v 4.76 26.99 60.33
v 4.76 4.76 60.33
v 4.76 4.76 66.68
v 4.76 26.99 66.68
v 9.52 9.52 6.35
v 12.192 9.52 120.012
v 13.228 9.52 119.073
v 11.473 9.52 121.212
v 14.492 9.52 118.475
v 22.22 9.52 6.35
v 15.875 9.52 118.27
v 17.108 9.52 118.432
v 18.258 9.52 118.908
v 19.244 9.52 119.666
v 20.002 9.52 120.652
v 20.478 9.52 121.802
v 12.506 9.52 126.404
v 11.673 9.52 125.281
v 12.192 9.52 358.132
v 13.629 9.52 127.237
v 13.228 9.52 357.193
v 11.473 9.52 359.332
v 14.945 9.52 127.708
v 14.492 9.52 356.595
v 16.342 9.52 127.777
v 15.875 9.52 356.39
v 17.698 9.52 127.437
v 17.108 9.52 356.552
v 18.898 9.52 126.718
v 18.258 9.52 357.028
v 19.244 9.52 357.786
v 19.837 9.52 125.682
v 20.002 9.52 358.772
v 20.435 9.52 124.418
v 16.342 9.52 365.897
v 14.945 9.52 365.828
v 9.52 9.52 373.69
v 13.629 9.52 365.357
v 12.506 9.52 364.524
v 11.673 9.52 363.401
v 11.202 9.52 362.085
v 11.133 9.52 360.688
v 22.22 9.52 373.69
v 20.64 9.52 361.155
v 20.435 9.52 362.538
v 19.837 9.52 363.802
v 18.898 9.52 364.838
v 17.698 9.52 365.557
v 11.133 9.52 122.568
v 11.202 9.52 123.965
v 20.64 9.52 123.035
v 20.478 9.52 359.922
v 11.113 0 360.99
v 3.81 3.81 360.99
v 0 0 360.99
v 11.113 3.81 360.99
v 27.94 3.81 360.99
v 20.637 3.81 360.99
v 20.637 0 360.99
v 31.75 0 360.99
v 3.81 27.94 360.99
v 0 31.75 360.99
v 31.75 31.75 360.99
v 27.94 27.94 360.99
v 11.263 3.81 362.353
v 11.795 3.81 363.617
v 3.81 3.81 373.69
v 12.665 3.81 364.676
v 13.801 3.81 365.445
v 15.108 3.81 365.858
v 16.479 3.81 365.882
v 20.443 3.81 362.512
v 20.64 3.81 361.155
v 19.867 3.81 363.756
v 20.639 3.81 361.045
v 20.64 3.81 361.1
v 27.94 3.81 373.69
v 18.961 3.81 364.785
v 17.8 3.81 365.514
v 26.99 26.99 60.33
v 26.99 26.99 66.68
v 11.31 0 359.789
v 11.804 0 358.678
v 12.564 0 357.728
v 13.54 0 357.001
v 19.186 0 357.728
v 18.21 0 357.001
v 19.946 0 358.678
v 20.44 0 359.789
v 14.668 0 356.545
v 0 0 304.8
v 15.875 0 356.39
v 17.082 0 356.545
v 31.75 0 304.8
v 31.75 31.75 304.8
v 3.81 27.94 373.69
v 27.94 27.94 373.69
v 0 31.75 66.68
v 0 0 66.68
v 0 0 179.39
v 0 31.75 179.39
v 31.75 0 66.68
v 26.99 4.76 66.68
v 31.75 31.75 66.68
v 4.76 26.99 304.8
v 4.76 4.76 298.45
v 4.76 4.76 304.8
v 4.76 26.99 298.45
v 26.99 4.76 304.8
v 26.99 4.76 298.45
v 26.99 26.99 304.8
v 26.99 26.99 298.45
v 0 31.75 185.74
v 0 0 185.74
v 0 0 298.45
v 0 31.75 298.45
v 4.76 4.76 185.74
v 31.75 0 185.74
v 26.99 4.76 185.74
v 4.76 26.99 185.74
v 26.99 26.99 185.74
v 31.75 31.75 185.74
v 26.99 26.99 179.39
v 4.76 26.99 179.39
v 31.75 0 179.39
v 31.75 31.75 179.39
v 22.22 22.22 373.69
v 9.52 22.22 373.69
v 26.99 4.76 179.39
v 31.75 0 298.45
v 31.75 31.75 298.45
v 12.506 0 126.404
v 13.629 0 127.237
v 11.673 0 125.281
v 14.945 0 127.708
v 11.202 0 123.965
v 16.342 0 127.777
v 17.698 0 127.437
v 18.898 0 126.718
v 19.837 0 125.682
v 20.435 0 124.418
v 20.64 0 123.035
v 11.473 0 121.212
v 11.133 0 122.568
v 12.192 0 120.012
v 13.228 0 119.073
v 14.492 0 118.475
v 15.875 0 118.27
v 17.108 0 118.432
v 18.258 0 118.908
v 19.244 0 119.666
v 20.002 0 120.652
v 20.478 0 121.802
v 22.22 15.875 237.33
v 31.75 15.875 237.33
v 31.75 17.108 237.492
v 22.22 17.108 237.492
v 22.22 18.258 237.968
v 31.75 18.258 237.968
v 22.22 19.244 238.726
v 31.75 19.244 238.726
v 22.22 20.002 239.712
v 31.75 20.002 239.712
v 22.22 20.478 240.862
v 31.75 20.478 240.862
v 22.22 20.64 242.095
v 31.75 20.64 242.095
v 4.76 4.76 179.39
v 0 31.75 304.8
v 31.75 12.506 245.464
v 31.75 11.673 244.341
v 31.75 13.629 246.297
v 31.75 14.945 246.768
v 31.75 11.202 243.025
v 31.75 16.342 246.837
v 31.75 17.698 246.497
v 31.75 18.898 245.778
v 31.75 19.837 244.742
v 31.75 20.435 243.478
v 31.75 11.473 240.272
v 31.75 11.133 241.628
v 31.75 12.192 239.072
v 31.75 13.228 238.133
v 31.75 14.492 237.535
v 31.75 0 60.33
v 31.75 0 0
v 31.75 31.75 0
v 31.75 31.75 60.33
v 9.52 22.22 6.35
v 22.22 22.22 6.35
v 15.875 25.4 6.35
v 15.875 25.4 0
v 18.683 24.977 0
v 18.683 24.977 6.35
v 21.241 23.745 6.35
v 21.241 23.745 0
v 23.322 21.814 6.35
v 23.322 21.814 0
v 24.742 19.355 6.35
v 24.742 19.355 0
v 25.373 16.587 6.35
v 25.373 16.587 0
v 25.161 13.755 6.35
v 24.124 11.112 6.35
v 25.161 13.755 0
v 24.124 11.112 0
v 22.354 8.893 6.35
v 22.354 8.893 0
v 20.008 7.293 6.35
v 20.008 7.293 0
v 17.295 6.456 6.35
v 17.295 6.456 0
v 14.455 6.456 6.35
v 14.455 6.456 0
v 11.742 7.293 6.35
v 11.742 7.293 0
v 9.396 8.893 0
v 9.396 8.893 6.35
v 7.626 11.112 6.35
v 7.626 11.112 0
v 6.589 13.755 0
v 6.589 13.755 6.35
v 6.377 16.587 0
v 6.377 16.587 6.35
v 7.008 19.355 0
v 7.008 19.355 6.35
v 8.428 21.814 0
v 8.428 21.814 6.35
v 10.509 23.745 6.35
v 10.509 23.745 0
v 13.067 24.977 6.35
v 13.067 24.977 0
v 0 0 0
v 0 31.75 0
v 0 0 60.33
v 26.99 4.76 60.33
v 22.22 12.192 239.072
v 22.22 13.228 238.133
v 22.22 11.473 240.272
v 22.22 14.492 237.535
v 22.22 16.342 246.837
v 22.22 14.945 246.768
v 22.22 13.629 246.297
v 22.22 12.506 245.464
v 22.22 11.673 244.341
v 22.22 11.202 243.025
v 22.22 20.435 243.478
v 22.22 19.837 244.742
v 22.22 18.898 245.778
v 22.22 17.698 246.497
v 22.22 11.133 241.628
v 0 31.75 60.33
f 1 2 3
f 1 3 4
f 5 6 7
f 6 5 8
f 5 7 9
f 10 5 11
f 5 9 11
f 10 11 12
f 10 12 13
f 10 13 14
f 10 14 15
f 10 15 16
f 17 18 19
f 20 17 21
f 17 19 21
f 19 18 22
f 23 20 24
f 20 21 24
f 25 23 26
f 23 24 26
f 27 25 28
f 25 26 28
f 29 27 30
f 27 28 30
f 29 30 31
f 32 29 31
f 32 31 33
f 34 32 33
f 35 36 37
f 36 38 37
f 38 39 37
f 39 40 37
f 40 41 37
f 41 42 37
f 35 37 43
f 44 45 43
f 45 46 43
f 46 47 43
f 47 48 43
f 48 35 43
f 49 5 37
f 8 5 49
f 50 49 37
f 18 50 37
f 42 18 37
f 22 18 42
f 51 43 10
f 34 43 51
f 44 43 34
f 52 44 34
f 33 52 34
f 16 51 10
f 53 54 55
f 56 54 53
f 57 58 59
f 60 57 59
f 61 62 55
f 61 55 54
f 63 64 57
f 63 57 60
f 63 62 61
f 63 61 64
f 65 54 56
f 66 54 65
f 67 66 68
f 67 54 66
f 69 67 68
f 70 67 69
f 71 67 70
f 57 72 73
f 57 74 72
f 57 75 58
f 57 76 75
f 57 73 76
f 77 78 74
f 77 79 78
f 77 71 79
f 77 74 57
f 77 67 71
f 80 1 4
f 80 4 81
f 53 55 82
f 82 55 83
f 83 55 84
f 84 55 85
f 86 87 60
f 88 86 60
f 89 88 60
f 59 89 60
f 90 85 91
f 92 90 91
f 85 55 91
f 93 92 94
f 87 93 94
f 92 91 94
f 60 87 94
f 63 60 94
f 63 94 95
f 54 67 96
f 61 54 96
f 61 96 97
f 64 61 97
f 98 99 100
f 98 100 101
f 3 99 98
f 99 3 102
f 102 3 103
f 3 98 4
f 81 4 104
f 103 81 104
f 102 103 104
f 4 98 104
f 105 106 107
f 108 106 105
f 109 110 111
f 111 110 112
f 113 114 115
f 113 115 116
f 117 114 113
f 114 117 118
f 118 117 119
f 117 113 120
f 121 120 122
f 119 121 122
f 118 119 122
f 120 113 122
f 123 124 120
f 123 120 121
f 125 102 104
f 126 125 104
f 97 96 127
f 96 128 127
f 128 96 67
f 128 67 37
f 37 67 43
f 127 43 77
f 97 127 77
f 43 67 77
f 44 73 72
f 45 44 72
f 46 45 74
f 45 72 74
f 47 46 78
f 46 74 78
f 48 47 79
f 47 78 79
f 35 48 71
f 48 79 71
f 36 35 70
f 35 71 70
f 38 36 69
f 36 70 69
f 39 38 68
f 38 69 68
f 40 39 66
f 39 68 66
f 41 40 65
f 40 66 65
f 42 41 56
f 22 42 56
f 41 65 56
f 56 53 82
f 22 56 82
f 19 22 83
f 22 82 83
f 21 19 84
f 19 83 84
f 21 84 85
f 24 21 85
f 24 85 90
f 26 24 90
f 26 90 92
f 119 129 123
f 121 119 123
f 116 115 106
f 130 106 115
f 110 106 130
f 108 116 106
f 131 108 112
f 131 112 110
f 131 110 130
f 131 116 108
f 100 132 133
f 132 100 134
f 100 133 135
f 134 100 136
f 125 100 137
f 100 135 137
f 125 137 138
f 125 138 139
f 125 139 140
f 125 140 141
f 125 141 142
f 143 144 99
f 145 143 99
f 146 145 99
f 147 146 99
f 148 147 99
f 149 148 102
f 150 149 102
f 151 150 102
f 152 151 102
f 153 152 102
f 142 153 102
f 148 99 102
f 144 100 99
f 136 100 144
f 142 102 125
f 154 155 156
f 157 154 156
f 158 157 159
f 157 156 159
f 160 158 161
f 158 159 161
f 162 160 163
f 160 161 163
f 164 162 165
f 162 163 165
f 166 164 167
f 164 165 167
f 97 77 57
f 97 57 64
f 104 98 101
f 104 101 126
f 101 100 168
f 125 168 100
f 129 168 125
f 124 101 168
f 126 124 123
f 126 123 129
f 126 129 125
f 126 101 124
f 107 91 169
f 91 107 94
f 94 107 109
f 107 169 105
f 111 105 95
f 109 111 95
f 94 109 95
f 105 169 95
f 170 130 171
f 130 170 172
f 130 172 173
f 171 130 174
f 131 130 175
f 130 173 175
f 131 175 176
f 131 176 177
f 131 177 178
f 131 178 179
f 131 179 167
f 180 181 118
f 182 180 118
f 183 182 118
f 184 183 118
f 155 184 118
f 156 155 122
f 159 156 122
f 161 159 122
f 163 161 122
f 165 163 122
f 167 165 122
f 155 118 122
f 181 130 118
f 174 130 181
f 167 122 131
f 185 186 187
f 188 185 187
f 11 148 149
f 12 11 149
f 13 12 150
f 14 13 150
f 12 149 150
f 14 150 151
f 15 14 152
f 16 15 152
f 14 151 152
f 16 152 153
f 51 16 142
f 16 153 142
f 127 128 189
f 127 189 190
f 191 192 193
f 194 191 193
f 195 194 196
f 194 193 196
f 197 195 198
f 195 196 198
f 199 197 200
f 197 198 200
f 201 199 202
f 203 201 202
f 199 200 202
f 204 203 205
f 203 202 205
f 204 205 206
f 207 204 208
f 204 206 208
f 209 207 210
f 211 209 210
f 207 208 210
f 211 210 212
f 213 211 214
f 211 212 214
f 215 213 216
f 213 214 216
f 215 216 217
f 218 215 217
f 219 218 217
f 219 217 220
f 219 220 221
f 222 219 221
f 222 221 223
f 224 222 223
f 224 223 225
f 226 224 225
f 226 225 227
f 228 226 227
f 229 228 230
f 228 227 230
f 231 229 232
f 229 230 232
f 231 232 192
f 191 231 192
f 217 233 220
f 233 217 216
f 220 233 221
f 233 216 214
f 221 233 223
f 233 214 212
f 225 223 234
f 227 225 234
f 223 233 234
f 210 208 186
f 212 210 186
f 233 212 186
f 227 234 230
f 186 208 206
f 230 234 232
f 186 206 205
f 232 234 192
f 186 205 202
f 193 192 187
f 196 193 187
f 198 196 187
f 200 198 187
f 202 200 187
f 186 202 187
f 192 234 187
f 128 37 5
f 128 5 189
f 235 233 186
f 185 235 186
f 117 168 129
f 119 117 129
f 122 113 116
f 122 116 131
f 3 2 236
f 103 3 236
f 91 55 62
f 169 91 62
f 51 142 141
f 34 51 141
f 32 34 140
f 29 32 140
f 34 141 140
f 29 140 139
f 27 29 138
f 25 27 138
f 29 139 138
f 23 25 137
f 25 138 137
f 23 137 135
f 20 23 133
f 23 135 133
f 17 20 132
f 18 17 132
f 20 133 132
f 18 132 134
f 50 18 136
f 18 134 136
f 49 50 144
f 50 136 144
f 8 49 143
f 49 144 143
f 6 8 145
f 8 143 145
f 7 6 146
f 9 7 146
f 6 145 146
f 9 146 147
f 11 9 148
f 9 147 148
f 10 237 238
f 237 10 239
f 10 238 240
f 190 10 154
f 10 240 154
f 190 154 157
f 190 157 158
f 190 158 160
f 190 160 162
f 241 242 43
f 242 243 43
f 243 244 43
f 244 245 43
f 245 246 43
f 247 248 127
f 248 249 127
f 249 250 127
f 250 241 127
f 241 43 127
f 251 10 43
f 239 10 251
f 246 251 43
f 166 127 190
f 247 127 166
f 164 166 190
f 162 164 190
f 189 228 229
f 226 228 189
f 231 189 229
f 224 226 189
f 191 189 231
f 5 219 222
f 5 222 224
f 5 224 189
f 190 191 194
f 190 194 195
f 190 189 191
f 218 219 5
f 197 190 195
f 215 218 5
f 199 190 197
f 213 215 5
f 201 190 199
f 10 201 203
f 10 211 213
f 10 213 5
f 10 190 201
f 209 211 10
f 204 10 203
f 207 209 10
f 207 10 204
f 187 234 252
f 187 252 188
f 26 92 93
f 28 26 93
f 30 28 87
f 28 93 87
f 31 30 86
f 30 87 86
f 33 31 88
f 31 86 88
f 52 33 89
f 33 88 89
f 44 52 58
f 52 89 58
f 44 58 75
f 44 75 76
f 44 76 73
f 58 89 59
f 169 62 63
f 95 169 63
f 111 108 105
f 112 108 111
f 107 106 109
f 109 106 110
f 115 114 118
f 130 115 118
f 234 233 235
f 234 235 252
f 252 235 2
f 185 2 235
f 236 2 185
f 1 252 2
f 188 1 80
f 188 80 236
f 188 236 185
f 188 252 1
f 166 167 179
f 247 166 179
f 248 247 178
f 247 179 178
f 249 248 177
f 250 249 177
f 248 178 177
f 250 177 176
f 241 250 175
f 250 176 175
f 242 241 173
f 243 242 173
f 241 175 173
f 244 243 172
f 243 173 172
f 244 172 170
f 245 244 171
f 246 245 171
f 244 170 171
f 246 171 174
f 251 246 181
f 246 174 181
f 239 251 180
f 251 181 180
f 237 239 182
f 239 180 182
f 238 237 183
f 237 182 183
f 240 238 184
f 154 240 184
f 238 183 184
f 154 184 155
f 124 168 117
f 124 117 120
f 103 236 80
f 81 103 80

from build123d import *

# Parameters (mm, degrees)
F0_W      = 31.75
F0_H      = 31.75
F1_DEPTH  = 60.33
F2_W      = 22.23
F2_H      = 22.23
F3_DEPTH  = 6.35
F4_W      = 31.75
F4_H      = 31.75
F5_DEPTH  = 112.71
F6_W      = 22.23
F6_H      = 22.23
F7_DEPTH  = 6.35
F8_W      = 31.75
F8_H      = 31.75
F8_W_2    = 22.23
F8_H_2    = 22.23
F9_DEPTH  = 112.71
F10_W     = 22.23
F10_H     = 22.23
F11_DEPTH = 6.35
F12_W     = 31.75
F12_H     = 31.75
F12_W_2   = 22.23
F12_H_2   = 22.23
F13_DEPTH = 112.71
F14_W     = 22.23
F14_H     = 22.23
F15_DEPTH = 6.35
F16_W     = 31.75
F16_H     = 31.75
F17_DEPTH = 112.71
F18_W     = 22.23
F18_H     = 22.23
F19_DEPTH = 6.35
F20_W     = 31.75
F20_H     = 31.75
F20_W_2   = 22.23
F20_H_2   = 22.23
F21_DEPTH = 112.71
F22_W     = 22.23
F22_H     = 22.23
F23_DEPTH = 6.35
F24_W     = 31.75
F24_H     = 31.75
F24_W_2   = 22.23
F24_H_2   = 22.23
F25_DEPTH = 25.4
F26_W     = 22.23
F26_H     = 22.23
F27_DEPTH = 6.35
F28_W     = 31.75
F28_H     = 31.75
F28_W_2   = 22.23
F28_H_2   = 22.23
F29_DEPTH = 31.75
F32_DEPTH = 12.7
F34_DEPTH = 12.7
F36_DEPTH = 12.7
F38_DEPTH = 12.7
F40_DEPTH = 12.7
F41_W     = 12.7
F41_H     = 12.7
F42_DEPTH = 736.6
F43_DEPTH = 6.35
F44_W     = 31.75
F44_H     = 351.79
F45_DEPTH = 76.2
F46_W     = 31.75
F46_H     = 31.75
F46_W_2   = 24.13
F46_H_2   = 24.13
F47_DEPTH = 12.7


with BuildPart() as f1:
    # F0 (on Top) → F1 (new body)
    with BuildSketch(Plane.XY):
        with Locations((15.875, 15.875)):
            Rectangle(F0_W, F0_H)
    extrude(amount=F1_DEPTH)

    # F2 (on face) → F3 (join)
    with BuildSketch(Plane.XY.offset(60.33)):
        with Locations((15.875, 15.875)):
            Rectangle(F2_W, F2_H)
    extrude(amount=F3_DEPTH)

    # F4 (on face) → F5 (join)
    with BuildSketch(Plane.XY.offset(66.68)):
        with Locations((15.875, 15.875)):
            Rectangle(F4_W, F4_H)
    extrude(amount=F5_DEPTH)

    # F6 (on face) → F7 (join)
    with BuildSketch(Plane.XY.offset(179.39)):
        with Locations((15.875, 15.875)):
            Rectangle(F6_W, F6_H)
    extrude(amount=F7_DEPTH)

    # F8 (on face) → F9 (join)
    with BuildSketch(Plane.XY.offset(185.74)):
        with Locations((15.875, 15.875)):
            Rectangle(F8_W, F8_H)
        with Locations((15.875, 15.875)):
            Rectangle(F8_W_2, F8_H_2, mode=Mode.SUBTRACT)
        with Locations((15.875, 15.875)):
            Rectangle(F8_W_2, F8_H_2)
    extrude(amount=F9_DEPTH)

    # F10 (on face) → F11 (join)
    with BuildSketch(Plane.XY.offset(298.45)):
        with Locations((15.875, 15.875)):
            Rectangle(F10_W, F10_H)
    extrude(amount=F11_DEPTH)

    # F12 (on face) → F13 (join)
    with BuildSketch(Plane.XY.offset(304.8)):
        with Locations((15.875, 15.875)):
            Rectangle(F12_W, F12_H)
        with Locations((15.875, 15.875)):
            Rectangle(F12_W_2, F12_H_2, mode=Mode.SUBTRACT)
        with Locations((15.875, 15.875)):
            Rectangle(F12_W_2, F12_H_2)
    extrude(amount=F13_DEPTH)

    # F14 (on face) → F15 (join)
    with BuildSketch(Plane.XY.offset(417.51)):
        with Locations((15.875, 15.875)):
            Rectangle(F14_W, F14_H)
    extrude(amount=F15_DEPTH)

    # F16 (on face) → F17 (join)
    with BuildSketch(Plane.XY.offset(423.86)):
        with Locations((15.875, 15.875)):
            Rectangle(F16_W, F16_H)
    extrude(amount=F17_DEPTH)

    # F18 (on face) → F19 (join)
    with BuildSketch(Plane.XY.offset(536.57)):
        with Locations((15.875, 15.875)):
            Rectangle(F18_W, F18_H)
    extrude(amount=F19_DEPTH)

    # F20 (on face) → F21 (join)
    with BuildSketch(Plane.XY.offset(542.92)):
        with Locations((15.875, 15.875)):
            Rectangle(F20_W, F20_H)
        with Locations((15.875, 15.875)):
            Rectangle(F20_W_2, F20_H_2, mode=Mode.SUBTRACT)
        with Locations((15.875, 15.875)):
            Rectangle(F20_W_2, F20_H_2)
    extrude(amount=F21_DEPTH)

    # F22 (on face) → F23 (join)
    with BuildSketch(Plane.XY.offset(655.63)):
        with Locations((15.875, 15.875)):
            Rectangle(F22_W, F22_H)
    extrude(amount=F23_DEPTH)

    # F24 (on face) → F25 (join)
    with BuildSketch(Plane.XY.offset(661.98)):
        with Locations((15.875, 15.875)):
            Rectangle(F24_W, F24_H)
        with Locations((15.875, 15.875)):
            Rectangle(F24_W_2, F24_H_2, mode=Mode.SUBTRACT)
        with Locations((15.875, 15.875)):
            Rectangle(F24_W_2, F24_H_2)
    extrude(amount=F25_DEPTH)

    # F26 (on face) → F27 (join)
    with BuildSketch(Plane.XY.offset(687.38)):
        with Locations((15.875, 15.875)):
            Rectangle(F26_W, F26_H)
    extrude(amount=F27_DEPTH)

    # F28 (on face) → F29 (join)
    with BuildSketch(Plane.XY.offset(693.73)):
        with Locations((15.875, 15.875)):
            Rectangle(F28_W, F28_H)
        with Locations((15.875, 15.875)):
            Rectangle(F28_W_2, F28_H_2, mode=Mode.SUBTRACT)
        with Locations((15.875, 15.875)):
            Rectangle(F28_W_2, F28_H_2)
    extrude(amount=F29_DEPTH)

    # F31 (on face) → F32 (cut)
    with BuildSketch(Plane.XZ):
        with BuildLine():
            Line((15.875, 123.035), (20.64, 123.035))
            ThreePointArc((20.64, 123.035), (12.5056361876, 126.4043638124), (15.875, 118.27))
            Line((15.875, 118.27), (15.875, 123.035))
        make_face()
        with BuildLine():
            ThreePointArc((15.875, 118.27), (19.2443638124, 119.6656361876), (20.64, 123.035))
            Line((20.64, 123.035), (15.875, 123.035))
            Line((15.875, 123.035), (15.875, 118.27))
        make_face()
    extrude(amount=-F32_DEPTH, mode=Mode.SUBTRACT)

    # F33 (on face) → F34 (cut)
    with BuildSketch(Plane.YZ.offset(31.75)):
        with BuildLine():
            Line((15.875, 242.095), (20.64, 242.095))
            ThreePointArc((20.64, 242.095), (12.5056361876, 245.4643638124), (15.875, 237.33))
            Line((15.875, 237.33), (15.875, 242.095))
        make_face()
        with BuildLine():
            ThreePointArc((15.875, 237.33), (19.2443638124, 238.7256361876), (20.64, 242.095))
            Line((20.64, 242.095), (15.875, 242.095))
            Line((15.875, 242.095), (15.875, 237.33))
        make_face()
    extrude(amount=-F34_DEPTH, mode=Mode.SUBTRACT)

    # F35 (on face) → F36 (cut)
    with BuildSketch(Plane.XZ):
        with BuildLine():
            Line((15.875, 361.155), (20.64, 361.155))
            ThreePointArc((20.64, 361.155), (12.5056361876, 364.5243638124), (15.875, 356.39))
            Line((15.875, 356.39), (15.875, 361.155))
        make_face()
        with BuildLine():
            ThreePointArc((15.875, 356.39), (19.2443638124, 357.7856361876), (20.64, 361.155))
            Line((20.64, 361.155), (15.875, 361.155))
            Line((15.875, 361.155), (15.875, 356.39))
        make_face()
    extrude(amount=-F36_DEPTH, mode=Mode.SUBTRACT)

    # F37 (on face) → F38 (cut)
    with BuildSketch(Plane.YZ.offset(31.75)):
        with BuildLine():
            Line((15.875, 480.215), (20.64, 480.215))
            ThreePointArc((20.64, 480.215), (12.5056361876, 483.5843638124), (15.875, 475.45))
            Line((15.875, 475.45), (15.875, 480.215))
        make_face()
        with BuildLine():
            ThreePointArc((15.875, 475.45), (19.2443638124, 476.8456361876), (20.64, 480.215))
            Line((20.64, 480.215), (15.875, 480.215))
            Line((15.875, 480.215), (15.875, 475.45))
        make_face()
    extrude(amount=-F38_DEPTH, mode=Mode.SUBTRACT)

    # F39 (on face) → F40 (cut)
    with BuildSketch(Plane.XZ):
        with BuildLine():
            Line((15.875, 599.275), (20.64, 599.275))
            ThreePointArc((20.64, 599.275), (12.5056361876, 602.6443638124), (15.875, 594.51))
            Line((15.875, 594.51), (15.875, 599.275))
        make_face()
        with BuildLine():
            ThreePointArc((15.875, 594.51), (19.2443638124, 595.9056361876), (20.64, 599.275))
            Line((20.64, 599.275), (15.875, 599.275))
            Line((15.875, 599.275), (15.875, 594.51))
        make_face()
    extrude(amount=-F40_DEPTH, mode=Mode.SUBTRACT)

    # F41 (on face) → F42 (cut)
    with BuildSketch(Plane.XY.offset(725.48)):
        with Locations((15.87, 15.87)):
            Rectangle(F41_W, F41_H)
    extrude(amount=-F42_DEPTH, mode=Mode.SUBTRACT)

    # F30 (on face) → F43 (cut)
    with BuildSketch(Plane(origin=(0, 0, 0), x_dir=(1, 0, 0), z_dir=(0, 0, -1))):
        with BuildLine():
            ThreePointArc((6.35, -15.875), (9.1398079092, -22.6101920908), (15.875, -25.4))
            Line((15.875, -25.4), (15.875, -15.875))
            Line((15.875, -15.875), (6.35, -15.875))
        make_face()
        with BuildLine():
            Line((15.875, -15.875), (15.875, -25.4))
            ThreePointArc((15.875, -25.4), (22.6101920908, -22.6101920908), (25.4, -15.875))
            ThreePointArc((25.4, -15.875), (15.875, -6.35), (6.35, -15.875))
            Line((6.35, -15.875), (15.875, -15.875))
        make_face()
    extrude(amount=-F43_DEPTH, mode=Mode.SUBTRACT)

    # F44 (on face) → F45 (cut)
    with BuildSketch(Plane.XZ):
        with Locations((15.875, 549.585)):
            Rectangle(F44_W, F44_H)
    extrude(amount=-F45_DEPTH, mode=Mode.SUBTRACT)

    # F46 (on face) → F47 (cut)
    with BuildSketch(Plane.XY.offset(373.69)):
        with Locations((15.875, 15.875)):
            Rectangle(F46_W, F46_H)
        with Locations((15.875, 15.875)):
            Rectangle(F46_W_2, F46_H_2, mode=Mode.SUBTRACT)
    extrude(amount=-F47_DEPTH, mode=Mode.SUBTRACT)


solid = f1.part
